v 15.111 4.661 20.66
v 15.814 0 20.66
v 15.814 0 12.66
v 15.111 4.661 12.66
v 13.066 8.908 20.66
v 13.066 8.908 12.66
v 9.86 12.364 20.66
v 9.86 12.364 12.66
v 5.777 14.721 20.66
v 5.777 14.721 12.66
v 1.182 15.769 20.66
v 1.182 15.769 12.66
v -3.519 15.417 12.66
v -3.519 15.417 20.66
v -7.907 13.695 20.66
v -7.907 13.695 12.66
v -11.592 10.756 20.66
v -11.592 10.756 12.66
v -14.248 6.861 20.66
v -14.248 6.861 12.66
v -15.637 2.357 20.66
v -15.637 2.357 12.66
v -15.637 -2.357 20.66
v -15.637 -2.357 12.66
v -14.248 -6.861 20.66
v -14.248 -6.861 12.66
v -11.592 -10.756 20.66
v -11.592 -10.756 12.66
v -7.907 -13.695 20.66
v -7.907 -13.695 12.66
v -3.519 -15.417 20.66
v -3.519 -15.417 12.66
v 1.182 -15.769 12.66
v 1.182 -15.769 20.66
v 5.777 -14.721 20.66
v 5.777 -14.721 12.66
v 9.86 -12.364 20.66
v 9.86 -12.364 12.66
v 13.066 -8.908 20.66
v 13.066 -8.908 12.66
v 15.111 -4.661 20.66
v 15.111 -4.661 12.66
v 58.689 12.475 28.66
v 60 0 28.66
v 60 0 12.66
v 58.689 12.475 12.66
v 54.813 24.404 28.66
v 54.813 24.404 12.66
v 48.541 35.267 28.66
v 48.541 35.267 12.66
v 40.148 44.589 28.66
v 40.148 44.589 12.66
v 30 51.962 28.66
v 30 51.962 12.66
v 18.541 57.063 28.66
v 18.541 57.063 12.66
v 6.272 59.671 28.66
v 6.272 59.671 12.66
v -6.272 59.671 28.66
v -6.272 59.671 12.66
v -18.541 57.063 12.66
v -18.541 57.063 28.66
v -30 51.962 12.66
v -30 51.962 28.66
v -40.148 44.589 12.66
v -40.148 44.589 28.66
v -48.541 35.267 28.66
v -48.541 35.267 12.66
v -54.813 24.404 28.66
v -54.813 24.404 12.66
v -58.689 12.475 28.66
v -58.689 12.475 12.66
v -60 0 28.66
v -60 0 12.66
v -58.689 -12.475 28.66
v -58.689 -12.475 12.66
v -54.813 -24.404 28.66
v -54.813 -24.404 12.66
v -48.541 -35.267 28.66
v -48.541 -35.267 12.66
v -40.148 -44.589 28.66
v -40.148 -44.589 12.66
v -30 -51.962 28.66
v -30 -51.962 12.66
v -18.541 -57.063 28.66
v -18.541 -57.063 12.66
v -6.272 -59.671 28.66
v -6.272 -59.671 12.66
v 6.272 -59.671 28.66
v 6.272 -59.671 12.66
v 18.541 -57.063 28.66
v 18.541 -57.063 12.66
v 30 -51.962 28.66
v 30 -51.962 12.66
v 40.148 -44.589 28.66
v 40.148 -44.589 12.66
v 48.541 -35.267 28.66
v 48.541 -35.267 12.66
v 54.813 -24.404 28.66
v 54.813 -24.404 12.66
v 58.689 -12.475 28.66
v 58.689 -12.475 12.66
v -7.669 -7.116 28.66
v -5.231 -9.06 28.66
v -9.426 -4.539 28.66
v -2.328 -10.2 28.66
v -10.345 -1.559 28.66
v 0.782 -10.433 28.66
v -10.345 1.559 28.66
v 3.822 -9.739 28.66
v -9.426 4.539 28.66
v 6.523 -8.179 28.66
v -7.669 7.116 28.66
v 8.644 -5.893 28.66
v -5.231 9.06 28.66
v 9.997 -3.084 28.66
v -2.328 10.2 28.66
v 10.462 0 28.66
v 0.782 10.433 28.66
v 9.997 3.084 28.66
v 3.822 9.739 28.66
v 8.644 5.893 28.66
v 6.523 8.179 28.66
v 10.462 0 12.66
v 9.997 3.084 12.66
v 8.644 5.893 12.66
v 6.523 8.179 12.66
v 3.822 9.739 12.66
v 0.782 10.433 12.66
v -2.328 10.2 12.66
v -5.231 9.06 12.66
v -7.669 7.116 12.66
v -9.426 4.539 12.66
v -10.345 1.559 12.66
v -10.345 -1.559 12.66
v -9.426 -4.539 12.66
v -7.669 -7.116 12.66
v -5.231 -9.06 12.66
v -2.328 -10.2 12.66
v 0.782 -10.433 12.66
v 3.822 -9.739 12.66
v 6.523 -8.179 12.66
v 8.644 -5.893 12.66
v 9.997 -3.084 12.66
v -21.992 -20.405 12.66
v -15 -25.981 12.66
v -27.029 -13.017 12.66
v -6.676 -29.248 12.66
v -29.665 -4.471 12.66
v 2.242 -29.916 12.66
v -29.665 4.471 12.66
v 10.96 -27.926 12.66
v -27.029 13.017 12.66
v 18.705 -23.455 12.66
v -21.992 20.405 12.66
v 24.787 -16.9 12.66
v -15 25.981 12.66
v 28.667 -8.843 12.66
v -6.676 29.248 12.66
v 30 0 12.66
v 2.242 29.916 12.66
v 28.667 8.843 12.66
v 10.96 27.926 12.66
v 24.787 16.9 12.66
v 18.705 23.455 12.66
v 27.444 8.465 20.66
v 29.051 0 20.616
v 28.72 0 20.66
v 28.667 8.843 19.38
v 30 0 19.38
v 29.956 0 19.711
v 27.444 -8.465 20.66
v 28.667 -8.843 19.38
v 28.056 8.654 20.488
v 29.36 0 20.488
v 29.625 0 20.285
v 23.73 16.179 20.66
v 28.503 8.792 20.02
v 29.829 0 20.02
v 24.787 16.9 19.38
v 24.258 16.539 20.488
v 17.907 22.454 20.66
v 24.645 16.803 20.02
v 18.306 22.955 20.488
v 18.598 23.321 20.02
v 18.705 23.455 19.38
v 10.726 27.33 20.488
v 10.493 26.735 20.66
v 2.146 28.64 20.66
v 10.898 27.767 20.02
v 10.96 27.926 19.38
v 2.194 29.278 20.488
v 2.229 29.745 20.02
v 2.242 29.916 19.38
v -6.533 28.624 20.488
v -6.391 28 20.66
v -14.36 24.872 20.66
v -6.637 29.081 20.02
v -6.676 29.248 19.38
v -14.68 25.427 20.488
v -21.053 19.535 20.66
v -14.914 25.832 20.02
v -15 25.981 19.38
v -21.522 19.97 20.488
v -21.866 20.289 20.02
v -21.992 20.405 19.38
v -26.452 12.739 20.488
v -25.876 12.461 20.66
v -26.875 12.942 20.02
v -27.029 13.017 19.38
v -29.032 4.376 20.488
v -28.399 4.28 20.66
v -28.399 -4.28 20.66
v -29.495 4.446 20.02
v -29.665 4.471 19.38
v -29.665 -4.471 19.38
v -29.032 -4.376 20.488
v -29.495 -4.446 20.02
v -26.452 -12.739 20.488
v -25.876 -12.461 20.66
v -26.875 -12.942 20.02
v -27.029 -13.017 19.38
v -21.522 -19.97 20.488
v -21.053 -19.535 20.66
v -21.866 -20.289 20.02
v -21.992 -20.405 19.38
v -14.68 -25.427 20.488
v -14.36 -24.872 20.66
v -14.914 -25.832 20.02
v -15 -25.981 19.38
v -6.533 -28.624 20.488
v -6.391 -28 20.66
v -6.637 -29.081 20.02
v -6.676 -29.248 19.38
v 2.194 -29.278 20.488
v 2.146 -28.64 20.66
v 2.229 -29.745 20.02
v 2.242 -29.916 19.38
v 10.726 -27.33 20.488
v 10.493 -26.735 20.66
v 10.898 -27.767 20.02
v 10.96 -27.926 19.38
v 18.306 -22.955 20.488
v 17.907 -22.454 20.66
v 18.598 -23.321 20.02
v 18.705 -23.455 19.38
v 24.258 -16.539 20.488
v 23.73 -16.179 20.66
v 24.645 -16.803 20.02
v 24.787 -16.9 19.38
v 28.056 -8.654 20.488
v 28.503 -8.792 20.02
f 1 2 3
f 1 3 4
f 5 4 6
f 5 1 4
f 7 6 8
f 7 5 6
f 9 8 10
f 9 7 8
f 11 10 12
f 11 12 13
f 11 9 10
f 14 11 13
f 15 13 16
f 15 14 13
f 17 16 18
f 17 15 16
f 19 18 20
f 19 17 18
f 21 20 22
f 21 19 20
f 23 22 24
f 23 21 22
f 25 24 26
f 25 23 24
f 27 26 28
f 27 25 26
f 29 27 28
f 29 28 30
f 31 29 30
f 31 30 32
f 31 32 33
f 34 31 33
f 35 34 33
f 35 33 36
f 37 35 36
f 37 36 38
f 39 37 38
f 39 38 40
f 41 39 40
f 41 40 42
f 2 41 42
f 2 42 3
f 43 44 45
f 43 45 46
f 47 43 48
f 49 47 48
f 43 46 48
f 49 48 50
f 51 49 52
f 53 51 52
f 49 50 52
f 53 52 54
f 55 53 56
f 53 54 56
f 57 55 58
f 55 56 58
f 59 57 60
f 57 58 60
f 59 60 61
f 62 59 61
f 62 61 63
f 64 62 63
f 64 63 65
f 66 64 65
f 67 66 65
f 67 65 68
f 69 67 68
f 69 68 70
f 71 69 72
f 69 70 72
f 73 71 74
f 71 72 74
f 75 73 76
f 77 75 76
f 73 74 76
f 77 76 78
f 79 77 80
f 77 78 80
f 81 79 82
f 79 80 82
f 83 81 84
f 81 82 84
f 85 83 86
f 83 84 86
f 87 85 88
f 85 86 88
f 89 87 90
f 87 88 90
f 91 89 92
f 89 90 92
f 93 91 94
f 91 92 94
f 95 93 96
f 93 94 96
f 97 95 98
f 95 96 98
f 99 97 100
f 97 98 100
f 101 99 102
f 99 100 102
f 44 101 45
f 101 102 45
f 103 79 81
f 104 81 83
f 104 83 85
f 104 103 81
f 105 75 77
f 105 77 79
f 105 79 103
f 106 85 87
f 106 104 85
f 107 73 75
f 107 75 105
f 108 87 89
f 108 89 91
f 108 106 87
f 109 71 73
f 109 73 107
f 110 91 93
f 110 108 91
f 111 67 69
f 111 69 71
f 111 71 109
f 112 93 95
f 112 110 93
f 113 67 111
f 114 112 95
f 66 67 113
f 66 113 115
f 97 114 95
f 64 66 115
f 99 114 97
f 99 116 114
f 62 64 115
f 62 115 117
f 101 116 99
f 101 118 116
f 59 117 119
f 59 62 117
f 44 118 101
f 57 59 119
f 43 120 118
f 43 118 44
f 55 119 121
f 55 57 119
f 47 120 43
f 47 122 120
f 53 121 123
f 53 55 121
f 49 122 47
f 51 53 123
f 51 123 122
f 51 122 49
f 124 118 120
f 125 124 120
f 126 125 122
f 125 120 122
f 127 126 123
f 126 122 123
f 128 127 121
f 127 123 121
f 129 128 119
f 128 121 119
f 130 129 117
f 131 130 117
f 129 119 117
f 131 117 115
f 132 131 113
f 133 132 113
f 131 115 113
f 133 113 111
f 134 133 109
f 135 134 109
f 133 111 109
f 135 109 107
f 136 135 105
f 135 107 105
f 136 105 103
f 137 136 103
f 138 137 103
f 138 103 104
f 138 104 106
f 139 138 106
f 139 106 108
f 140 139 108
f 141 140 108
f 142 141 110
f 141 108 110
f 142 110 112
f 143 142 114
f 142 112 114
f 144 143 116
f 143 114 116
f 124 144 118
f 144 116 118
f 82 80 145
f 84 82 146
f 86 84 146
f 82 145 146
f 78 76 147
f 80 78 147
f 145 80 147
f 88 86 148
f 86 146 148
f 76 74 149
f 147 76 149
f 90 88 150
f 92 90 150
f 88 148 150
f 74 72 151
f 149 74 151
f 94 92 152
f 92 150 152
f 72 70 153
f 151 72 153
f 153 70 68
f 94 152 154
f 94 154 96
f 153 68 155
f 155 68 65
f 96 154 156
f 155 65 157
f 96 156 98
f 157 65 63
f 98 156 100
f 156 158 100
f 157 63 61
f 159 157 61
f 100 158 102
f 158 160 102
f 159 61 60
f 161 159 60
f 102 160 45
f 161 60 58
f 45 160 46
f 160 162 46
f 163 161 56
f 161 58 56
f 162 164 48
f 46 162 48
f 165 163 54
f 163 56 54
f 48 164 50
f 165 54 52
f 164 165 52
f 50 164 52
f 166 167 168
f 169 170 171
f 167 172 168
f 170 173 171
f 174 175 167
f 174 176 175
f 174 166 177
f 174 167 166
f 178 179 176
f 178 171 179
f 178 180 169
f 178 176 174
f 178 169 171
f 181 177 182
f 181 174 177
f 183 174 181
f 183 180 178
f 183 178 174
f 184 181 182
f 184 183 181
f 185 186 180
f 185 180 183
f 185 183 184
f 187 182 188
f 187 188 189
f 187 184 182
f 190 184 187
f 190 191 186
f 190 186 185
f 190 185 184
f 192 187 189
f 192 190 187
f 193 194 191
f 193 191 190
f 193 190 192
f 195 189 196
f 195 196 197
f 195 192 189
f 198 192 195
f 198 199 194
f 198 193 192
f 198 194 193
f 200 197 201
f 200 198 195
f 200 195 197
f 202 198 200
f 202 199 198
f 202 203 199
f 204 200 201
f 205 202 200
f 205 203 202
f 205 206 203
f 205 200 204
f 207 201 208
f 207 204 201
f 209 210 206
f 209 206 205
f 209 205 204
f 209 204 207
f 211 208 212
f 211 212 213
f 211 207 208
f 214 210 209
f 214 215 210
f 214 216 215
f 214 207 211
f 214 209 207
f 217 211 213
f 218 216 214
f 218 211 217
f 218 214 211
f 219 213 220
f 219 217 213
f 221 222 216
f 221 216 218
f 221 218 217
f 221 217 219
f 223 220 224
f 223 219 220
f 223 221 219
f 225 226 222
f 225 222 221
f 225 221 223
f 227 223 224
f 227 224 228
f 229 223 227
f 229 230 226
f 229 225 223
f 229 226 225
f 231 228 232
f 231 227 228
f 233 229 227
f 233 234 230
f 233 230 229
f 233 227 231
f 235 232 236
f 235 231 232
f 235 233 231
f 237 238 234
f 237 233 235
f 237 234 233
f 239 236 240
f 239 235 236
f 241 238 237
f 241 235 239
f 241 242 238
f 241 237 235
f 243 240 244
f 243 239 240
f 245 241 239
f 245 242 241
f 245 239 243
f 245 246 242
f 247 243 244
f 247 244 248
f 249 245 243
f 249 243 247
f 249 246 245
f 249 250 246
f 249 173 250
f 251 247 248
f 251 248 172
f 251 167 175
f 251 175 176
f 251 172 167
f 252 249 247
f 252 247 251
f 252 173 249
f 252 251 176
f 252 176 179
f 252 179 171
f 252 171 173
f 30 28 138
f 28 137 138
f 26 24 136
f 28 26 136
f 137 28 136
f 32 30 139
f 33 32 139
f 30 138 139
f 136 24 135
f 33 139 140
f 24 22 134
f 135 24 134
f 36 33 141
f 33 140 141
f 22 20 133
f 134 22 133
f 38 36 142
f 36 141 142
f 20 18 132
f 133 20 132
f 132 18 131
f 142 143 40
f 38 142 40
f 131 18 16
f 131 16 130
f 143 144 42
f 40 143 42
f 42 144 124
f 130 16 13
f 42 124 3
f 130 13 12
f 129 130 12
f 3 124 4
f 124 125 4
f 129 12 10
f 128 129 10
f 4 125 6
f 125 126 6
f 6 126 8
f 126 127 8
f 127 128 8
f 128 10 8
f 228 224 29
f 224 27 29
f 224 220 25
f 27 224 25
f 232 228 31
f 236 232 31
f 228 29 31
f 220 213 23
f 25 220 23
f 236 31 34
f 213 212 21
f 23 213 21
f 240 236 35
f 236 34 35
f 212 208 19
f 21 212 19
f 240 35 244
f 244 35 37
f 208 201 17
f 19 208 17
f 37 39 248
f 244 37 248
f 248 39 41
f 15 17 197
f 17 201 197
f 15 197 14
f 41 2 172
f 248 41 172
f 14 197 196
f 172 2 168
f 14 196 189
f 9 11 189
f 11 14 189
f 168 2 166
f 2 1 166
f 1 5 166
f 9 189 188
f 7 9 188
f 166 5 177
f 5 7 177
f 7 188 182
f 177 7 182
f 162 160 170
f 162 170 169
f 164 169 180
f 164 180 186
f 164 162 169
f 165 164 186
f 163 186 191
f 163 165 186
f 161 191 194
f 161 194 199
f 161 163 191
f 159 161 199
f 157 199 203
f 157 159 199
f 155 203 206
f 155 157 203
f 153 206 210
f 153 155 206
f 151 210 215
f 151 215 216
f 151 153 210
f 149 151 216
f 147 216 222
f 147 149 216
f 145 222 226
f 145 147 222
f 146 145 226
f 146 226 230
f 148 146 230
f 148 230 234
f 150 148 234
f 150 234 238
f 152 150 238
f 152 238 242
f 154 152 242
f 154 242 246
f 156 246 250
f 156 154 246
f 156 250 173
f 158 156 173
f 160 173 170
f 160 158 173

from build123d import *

# Parameters (mm, degrees)
SKETCH_1_R          = 150
SKETCH_1_R_2        = 75
SKETCH_1_R_3        = 38.1
EXTRUDE_1_DEPTH     = 40
SKETCH_1_4_R        = 75
SKETCH_1_4_R_2      = 38.1
CUT_EXTRUDE_1_DEPTH = 20
FILLET_1_R          = 3.2
SCALE_1_SCALE       = 0.4
SKETCH_3_R          = 15.813682359
SKETCH_3_R_2        = 10.461949065
EXTRUDE_2_DEPTH     = 16


with BuildPart() as part:
    # 草图1 → 凸台-拉伸1 (new body)
    # profile 1 of 2: a face of its own
    with BuildSketch(Plane.XY):
        Circle(SKETCH_1_R)
        Circle(SKETCH_1_R_2, mode=Mode.SUBTRACT)
    # profile 2 of 2: a face of its own
    with BuildSketch(Plane.XY):
        Circle(SKETCH_1_R_2)
        Circle(SKETCH_1_R_3, mode=Mode.SUBTRACT)
    extrude(amount=EXTRUDE_1_DEPTH)

    # 草图1<4> → 切除-拉伸1 (cut)
    with BuildSketch(Plane.XY):
        Circle(SKETCH_1_4_R)
        Circle(SKETCH_1_4_R_2, mode=Mode.SUBTRACT)
    extrude(amount=CUT_EXTRUDE_1_DEPTH, mode=Mode.SUBTRACT)

    # 圆角1
    fillet_1_edges = [part.edges().sort_by_distance(p)[0] for p in [
        (-75, 0, 20),
    ]]
    fillet(fillet_1_edges, radius=FILLET_1_R)


with BuildPart() as part_1:
    # 缩放比例1: scaled about (0, 0, 21.099696872)
    add(part.part.scale(SCALE_1_SCALE).moved(Location((0, 0, 12.659818123))))

    # 草图3 → 凸台-拉伸2 (add)
    with BuildSketch(Plane.XY.offset(28.659818123)):
        Circle(SKETCH_3_R)
        Circle(SKETCH_3_R_2, mode=Mode.SUBTRACT)
    extrude(amount=-EXTRUDE_2_DEPTH)


solid = part_1.part
